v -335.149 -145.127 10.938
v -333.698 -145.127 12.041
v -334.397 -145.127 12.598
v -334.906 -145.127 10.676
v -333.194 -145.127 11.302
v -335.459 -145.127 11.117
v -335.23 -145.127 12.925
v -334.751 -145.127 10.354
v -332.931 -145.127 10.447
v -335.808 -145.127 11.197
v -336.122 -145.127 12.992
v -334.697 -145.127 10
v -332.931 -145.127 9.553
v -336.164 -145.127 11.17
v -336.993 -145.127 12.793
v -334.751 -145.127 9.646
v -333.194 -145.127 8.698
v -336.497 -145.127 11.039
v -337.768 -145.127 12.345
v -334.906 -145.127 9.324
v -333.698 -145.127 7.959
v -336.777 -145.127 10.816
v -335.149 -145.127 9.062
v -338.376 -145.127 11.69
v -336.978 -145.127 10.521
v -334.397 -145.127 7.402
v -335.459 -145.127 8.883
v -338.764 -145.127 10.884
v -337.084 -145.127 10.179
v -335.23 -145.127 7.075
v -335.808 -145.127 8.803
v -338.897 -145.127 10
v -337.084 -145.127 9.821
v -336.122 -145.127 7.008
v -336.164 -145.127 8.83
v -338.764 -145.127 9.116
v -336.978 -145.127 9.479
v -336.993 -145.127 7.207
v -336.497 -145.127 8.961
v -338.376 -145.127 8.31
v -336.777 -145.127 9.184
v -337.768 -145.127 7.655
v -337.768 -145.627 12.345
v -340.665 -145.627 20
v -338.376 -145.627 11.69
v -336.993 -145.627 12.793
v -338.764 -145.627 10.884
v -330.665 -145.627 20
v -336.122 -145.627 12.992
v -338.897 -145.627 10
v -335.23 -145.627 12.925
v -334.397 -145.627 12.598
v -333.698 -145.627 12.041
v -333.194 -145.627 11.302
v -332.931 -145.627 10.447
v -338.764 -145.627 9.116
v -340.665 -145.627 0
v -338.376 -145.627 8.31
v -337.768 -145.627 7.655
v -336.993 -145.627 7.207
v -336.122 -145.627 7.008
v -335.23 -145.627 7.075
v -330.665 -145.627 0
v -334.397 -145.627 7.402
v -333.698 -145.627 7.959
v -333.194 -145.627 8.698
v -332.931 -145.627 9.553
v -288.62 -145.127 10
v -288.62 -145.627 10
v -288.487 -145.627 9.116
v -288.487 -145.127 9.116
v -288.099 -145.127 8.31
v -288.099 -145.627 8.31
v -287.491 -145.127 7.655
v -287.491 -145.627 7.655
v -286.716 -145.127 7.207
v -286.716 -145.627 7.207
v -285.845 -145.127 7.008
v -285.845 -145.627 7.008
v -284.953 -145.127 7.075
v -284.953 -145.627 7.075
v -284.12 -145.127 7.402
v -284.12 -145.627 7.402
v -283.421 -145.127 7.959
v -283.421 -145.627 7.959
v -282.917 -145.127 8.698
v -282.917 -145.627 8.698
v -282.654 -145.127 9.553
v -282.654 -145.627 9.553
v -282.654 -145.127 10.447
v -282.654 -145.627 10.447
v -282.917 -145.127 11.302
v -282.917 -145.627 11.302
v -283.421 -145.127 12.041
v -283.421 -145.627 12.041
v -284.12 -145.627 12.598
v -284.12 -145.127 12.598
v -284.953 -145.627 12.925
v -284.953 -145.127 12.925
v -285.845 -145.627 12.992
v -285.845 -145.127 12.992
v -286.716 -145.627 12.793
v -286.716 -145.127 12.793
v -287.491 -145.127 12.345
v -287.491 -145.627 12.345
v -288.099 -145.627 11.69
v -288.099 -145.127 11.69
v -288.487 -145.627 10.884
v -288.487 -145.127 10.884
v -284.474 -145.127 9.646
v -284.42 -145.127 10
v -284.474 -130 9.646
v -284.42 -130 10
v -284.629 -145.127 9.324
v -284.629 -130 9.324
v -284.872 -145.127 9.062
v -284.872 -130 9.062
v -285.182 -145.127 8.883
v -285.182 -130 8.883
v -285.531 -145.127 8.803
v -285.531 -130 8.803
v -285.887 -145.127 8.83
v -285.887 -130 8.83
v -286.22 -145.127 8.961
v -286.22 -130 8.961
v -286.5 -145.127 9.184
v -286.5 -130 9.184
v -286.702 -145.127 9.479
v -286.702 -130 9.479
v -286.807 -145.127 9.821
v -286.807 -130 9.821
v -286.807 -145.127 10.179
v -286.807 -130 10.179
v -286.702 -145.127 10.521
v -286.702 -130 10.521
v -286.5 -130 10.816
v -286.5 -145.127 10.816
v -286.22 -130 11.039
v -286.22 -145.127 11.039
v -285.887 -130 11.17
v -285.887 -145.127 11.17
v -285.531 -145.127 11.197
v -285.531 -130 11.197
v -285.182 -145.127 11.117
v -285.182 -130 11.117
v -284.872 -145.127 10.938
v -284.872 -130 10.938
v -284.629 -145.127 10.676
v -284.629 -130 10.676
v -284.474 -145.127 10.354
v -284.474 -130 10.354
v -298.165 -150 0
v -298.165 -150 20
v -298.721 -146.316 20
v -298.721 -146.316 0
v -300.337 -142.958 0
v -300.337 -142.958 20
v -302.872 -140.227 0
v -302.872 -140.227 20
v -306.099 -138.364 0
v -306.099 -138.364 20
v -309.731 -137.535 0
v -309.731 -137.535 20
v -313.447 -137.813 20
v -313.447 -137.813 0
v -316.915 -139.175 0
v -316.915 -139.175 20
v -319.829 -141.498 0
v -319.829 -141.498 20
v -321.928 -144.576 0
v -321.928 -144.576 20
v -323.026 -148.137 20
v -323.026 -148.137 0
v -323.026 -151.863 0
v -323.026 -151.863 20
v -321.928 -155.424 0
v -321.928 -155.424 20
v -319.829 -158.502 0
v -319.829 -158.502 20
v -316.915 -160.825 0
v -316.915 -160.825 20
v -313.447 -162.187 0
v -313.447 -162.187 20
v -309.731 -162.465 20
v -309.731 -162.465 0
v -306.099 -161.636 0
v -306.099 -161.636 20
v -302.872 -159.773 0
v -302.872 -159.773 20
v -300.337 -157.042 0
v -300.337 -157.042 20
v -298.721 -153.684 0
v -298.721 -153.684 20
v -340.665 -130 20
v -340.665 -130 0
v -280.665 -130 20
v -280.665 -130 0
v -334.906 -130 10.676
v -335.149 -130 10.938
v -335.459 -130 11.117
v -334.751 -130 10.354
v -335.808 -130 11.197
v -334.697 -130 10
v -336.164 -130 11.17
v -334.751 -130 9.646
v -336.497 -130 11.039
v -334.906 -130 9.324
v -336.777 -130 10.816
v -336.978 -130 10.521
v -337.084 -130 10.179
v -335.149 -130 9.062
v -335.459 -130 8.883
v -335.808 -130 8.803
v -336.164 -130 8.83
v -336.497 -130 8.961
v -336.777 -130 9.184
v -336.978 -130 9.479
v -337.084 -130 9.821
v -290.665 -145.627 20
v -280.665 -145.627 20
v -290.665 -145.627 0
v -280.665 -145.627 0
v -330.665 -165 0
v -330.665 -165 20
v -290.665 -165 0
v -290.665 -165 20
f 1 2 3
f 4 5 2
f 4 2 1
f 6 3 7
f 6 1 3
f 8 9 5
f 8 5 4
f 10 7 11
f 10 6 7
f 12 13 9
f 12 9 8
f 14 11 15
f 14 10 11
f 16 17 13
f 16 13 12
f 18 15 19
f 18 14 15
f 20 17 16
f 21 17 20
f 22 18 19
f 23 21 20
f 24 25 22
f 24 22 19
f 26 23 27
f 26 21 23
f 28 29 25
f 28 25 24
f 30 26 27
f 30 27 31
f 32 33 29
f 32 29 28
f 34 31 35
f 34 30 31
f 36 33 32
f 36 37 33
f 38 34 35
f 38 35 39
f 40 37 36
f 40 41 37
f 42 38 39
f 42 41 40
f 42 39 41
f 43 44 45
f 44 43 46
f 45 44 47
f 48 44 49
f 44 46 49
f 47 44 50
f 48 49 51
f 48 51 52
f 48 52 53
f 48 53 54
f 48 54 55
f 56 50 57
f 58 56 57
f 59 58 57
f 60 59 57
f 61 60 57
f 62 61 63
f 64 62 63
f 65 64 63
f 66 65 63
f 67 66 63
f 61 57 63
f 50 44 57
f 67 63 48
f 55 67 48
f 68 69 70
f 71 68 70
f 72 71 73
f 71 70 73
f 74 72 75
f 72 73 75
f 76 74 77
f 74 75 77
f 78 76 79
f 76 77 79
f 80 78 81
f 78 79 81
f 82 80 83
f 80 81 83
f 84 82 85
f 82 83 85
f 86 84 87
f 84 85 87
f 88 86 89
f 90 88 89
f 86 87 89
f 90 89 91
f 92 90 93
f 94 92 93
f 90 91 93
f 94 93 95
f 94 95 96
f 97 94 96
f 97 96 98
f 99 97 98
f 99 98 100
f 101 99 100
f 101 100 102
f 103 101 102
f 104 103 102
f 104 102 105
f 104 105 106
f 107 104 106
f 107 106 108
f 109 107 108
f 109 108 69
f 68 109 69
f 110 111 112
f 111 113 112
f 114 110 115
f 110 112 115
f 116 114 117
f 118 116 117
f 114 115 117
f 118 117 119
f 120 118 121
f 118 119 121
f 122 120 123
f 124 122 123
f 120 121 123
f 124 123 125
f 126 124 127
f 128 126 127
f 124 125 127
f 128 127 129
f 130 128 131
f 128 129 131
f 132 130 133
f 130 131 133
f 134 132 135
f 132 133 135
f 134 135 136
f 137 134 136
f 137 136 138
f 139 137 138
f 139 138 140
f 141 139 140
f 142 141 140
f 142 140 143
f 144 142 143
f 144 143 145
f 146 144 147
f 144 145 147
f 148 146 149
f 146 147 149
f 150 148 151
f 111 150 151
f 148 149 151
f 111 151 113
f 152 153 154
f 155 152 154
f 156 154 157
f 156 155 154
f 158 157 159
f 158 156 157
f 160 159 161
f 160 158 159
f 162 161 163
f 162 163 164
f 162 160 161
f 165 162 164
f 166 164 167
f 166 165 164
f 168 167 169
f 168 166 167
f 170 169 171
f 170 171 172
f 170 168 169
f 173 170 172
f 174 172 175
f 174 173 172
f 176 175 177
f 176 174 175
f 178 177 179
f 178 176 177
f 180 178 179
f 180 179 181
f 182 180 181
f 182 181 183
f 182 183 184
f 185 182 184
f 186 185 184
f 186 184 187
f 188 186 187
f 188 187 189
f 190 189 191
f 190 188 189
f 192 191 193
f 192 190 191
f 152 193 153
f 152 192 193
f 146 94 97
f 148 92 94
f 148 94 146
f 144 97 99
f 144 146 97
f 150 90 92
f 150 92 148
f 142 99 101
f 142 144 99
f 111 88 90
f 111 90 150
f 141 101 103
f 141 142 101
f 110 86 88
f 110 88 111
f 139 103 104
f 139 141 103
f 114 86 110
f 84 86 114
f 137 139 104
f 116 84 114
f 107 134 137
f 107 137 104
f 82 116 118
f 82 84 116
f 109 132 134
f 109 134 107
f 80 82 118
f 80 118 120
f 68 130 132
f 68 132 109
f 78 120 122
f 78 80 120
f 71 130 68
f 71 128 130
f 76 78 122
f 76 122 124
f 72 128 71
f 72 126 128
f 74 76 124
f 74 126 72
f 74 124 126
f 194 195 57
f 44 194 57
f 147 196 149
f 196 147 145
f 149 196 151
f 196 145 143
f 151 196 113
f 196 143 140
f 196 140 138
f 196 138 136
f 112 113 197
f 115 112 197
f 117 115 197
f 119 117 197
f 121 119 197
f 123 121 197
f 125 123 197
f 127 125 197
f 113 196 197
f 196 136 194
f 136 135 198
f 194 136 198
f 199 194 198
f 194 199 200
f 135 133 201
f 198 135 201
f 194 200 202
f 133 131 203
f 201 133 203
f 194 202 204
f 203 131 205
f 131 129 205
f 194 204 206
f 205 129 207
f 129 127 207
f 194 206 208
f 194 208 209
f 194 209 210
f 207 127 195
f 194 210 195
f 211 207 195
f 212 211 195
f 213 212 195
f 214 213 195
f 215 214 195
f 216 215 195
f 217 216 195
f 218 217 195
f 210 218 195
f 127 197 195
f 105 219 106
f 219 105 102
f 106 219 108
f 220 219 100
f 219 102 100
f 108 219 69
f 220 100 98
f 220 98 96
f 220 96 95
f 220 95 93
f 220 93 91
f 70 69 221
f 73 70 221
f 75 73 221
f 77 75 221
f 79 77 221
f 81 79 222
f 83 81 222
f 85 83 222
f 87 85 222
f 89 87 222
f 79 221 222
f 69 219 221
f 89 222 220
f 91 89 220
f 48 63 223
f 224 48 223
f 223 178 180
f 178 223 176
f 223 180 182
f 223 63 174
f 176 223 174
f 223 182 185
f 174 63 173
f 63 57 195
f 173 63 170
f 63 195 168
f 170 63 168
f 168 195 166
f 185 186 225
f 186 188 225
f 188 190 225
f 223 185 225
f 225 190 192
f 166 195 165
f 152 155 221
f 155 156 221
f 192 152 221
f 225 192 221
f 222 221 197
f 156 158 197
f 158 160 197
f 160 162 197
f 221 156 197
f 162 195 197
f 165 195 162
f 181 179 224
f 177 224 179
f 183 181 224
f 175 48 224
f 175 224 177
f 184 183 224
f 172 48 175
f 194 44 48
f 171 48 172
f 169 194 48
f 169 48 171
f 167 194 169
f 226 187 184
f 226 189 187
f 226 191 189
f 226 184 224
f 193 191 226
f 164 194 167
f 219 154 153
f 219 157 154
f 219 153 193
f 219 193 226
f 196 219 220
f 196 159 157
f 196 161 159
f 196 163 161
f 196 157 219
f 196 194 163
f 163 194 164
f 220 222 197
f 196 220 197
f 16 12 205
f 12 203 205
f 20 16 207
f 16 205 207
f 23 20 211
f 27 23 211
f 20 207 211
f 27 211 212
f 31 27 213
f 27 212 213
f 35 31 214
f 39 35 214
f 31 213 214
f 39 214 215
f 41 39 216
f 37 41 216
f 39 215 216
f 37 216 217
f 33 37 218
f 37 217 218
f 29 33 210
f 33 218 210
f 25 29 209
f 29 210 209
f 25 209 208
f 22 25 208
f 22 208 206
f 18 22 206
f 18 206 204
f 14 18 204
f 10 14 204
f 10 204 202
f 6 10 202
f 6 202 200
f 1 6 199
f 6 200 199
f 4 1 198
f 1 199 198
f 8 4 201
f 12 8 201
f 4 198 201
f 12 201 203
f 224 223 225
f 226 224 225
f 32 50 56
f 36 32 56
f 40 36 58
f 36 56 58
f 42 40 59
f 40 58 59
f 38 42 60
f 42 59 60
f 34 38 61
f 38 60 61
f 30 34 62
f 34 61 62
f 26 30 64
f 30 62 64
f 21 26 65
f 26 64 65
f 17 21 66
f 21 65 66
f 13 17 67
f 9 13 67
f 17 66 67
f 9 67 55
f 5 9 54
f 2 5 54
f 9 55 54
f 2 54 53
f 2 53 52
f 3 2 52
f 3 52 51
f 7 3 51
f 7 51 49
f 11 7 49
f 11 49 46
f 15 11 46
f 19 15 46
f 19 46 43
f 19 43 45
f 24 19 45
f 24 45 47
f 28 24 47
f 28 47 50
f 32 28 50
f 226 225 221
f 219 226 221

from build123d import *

# Parameters (mm, degrees)
SKETCH_1_R                   = 12.5
EXTRUDE_1_DEPTH              = 20
HOLE_WIZARD_M2_1_D           = 2.4
HOLE_WIZARD_M2_1_CBORE_D     = 6
HOLE_WIZARD_M2_1_CBORE_DEPTH = 0.5


with BuildPart() as part:
    # 草图1 → 凸台-拉伸1 (new body)
    with BuildSketch(Plane.XY):
        Polygon((-340.66541114, -145.626712598), (-330.66541114, -145.626712598), (-330.66541114, -165), (-290.66541114, -165), (-290.66541114, -145.626712598), (-280.66541114, -145.626712598), (-280.66541114, -130), (-340.66541114, -130), align=None)
        with Locations((-310.66541114, -150)):
            Circle(SKETCH_1_R, mode=Mode.SUBTRACT)
    extrude(amount=EXTRUDE_1_DEPTH)

    # M2 六角头螺栓的柱形沉头孔1 (through all)
    with Locations(Plane(origin=(0, -145.626712598, 0), x_dir=(-1, 0, 0), z_dir=(0, -1, 0))):
        with Locations((335.897321014, -10), (285.620390856, -10)):
            CounterBoreHole(HOLE_WIZARD_M2_1_D / 2, HOLE_WIZARD_M2_1_CBORE_D / 2, HOLE_WIZARD_M2_1_CBORE_DEPTH)


solid = part.part
